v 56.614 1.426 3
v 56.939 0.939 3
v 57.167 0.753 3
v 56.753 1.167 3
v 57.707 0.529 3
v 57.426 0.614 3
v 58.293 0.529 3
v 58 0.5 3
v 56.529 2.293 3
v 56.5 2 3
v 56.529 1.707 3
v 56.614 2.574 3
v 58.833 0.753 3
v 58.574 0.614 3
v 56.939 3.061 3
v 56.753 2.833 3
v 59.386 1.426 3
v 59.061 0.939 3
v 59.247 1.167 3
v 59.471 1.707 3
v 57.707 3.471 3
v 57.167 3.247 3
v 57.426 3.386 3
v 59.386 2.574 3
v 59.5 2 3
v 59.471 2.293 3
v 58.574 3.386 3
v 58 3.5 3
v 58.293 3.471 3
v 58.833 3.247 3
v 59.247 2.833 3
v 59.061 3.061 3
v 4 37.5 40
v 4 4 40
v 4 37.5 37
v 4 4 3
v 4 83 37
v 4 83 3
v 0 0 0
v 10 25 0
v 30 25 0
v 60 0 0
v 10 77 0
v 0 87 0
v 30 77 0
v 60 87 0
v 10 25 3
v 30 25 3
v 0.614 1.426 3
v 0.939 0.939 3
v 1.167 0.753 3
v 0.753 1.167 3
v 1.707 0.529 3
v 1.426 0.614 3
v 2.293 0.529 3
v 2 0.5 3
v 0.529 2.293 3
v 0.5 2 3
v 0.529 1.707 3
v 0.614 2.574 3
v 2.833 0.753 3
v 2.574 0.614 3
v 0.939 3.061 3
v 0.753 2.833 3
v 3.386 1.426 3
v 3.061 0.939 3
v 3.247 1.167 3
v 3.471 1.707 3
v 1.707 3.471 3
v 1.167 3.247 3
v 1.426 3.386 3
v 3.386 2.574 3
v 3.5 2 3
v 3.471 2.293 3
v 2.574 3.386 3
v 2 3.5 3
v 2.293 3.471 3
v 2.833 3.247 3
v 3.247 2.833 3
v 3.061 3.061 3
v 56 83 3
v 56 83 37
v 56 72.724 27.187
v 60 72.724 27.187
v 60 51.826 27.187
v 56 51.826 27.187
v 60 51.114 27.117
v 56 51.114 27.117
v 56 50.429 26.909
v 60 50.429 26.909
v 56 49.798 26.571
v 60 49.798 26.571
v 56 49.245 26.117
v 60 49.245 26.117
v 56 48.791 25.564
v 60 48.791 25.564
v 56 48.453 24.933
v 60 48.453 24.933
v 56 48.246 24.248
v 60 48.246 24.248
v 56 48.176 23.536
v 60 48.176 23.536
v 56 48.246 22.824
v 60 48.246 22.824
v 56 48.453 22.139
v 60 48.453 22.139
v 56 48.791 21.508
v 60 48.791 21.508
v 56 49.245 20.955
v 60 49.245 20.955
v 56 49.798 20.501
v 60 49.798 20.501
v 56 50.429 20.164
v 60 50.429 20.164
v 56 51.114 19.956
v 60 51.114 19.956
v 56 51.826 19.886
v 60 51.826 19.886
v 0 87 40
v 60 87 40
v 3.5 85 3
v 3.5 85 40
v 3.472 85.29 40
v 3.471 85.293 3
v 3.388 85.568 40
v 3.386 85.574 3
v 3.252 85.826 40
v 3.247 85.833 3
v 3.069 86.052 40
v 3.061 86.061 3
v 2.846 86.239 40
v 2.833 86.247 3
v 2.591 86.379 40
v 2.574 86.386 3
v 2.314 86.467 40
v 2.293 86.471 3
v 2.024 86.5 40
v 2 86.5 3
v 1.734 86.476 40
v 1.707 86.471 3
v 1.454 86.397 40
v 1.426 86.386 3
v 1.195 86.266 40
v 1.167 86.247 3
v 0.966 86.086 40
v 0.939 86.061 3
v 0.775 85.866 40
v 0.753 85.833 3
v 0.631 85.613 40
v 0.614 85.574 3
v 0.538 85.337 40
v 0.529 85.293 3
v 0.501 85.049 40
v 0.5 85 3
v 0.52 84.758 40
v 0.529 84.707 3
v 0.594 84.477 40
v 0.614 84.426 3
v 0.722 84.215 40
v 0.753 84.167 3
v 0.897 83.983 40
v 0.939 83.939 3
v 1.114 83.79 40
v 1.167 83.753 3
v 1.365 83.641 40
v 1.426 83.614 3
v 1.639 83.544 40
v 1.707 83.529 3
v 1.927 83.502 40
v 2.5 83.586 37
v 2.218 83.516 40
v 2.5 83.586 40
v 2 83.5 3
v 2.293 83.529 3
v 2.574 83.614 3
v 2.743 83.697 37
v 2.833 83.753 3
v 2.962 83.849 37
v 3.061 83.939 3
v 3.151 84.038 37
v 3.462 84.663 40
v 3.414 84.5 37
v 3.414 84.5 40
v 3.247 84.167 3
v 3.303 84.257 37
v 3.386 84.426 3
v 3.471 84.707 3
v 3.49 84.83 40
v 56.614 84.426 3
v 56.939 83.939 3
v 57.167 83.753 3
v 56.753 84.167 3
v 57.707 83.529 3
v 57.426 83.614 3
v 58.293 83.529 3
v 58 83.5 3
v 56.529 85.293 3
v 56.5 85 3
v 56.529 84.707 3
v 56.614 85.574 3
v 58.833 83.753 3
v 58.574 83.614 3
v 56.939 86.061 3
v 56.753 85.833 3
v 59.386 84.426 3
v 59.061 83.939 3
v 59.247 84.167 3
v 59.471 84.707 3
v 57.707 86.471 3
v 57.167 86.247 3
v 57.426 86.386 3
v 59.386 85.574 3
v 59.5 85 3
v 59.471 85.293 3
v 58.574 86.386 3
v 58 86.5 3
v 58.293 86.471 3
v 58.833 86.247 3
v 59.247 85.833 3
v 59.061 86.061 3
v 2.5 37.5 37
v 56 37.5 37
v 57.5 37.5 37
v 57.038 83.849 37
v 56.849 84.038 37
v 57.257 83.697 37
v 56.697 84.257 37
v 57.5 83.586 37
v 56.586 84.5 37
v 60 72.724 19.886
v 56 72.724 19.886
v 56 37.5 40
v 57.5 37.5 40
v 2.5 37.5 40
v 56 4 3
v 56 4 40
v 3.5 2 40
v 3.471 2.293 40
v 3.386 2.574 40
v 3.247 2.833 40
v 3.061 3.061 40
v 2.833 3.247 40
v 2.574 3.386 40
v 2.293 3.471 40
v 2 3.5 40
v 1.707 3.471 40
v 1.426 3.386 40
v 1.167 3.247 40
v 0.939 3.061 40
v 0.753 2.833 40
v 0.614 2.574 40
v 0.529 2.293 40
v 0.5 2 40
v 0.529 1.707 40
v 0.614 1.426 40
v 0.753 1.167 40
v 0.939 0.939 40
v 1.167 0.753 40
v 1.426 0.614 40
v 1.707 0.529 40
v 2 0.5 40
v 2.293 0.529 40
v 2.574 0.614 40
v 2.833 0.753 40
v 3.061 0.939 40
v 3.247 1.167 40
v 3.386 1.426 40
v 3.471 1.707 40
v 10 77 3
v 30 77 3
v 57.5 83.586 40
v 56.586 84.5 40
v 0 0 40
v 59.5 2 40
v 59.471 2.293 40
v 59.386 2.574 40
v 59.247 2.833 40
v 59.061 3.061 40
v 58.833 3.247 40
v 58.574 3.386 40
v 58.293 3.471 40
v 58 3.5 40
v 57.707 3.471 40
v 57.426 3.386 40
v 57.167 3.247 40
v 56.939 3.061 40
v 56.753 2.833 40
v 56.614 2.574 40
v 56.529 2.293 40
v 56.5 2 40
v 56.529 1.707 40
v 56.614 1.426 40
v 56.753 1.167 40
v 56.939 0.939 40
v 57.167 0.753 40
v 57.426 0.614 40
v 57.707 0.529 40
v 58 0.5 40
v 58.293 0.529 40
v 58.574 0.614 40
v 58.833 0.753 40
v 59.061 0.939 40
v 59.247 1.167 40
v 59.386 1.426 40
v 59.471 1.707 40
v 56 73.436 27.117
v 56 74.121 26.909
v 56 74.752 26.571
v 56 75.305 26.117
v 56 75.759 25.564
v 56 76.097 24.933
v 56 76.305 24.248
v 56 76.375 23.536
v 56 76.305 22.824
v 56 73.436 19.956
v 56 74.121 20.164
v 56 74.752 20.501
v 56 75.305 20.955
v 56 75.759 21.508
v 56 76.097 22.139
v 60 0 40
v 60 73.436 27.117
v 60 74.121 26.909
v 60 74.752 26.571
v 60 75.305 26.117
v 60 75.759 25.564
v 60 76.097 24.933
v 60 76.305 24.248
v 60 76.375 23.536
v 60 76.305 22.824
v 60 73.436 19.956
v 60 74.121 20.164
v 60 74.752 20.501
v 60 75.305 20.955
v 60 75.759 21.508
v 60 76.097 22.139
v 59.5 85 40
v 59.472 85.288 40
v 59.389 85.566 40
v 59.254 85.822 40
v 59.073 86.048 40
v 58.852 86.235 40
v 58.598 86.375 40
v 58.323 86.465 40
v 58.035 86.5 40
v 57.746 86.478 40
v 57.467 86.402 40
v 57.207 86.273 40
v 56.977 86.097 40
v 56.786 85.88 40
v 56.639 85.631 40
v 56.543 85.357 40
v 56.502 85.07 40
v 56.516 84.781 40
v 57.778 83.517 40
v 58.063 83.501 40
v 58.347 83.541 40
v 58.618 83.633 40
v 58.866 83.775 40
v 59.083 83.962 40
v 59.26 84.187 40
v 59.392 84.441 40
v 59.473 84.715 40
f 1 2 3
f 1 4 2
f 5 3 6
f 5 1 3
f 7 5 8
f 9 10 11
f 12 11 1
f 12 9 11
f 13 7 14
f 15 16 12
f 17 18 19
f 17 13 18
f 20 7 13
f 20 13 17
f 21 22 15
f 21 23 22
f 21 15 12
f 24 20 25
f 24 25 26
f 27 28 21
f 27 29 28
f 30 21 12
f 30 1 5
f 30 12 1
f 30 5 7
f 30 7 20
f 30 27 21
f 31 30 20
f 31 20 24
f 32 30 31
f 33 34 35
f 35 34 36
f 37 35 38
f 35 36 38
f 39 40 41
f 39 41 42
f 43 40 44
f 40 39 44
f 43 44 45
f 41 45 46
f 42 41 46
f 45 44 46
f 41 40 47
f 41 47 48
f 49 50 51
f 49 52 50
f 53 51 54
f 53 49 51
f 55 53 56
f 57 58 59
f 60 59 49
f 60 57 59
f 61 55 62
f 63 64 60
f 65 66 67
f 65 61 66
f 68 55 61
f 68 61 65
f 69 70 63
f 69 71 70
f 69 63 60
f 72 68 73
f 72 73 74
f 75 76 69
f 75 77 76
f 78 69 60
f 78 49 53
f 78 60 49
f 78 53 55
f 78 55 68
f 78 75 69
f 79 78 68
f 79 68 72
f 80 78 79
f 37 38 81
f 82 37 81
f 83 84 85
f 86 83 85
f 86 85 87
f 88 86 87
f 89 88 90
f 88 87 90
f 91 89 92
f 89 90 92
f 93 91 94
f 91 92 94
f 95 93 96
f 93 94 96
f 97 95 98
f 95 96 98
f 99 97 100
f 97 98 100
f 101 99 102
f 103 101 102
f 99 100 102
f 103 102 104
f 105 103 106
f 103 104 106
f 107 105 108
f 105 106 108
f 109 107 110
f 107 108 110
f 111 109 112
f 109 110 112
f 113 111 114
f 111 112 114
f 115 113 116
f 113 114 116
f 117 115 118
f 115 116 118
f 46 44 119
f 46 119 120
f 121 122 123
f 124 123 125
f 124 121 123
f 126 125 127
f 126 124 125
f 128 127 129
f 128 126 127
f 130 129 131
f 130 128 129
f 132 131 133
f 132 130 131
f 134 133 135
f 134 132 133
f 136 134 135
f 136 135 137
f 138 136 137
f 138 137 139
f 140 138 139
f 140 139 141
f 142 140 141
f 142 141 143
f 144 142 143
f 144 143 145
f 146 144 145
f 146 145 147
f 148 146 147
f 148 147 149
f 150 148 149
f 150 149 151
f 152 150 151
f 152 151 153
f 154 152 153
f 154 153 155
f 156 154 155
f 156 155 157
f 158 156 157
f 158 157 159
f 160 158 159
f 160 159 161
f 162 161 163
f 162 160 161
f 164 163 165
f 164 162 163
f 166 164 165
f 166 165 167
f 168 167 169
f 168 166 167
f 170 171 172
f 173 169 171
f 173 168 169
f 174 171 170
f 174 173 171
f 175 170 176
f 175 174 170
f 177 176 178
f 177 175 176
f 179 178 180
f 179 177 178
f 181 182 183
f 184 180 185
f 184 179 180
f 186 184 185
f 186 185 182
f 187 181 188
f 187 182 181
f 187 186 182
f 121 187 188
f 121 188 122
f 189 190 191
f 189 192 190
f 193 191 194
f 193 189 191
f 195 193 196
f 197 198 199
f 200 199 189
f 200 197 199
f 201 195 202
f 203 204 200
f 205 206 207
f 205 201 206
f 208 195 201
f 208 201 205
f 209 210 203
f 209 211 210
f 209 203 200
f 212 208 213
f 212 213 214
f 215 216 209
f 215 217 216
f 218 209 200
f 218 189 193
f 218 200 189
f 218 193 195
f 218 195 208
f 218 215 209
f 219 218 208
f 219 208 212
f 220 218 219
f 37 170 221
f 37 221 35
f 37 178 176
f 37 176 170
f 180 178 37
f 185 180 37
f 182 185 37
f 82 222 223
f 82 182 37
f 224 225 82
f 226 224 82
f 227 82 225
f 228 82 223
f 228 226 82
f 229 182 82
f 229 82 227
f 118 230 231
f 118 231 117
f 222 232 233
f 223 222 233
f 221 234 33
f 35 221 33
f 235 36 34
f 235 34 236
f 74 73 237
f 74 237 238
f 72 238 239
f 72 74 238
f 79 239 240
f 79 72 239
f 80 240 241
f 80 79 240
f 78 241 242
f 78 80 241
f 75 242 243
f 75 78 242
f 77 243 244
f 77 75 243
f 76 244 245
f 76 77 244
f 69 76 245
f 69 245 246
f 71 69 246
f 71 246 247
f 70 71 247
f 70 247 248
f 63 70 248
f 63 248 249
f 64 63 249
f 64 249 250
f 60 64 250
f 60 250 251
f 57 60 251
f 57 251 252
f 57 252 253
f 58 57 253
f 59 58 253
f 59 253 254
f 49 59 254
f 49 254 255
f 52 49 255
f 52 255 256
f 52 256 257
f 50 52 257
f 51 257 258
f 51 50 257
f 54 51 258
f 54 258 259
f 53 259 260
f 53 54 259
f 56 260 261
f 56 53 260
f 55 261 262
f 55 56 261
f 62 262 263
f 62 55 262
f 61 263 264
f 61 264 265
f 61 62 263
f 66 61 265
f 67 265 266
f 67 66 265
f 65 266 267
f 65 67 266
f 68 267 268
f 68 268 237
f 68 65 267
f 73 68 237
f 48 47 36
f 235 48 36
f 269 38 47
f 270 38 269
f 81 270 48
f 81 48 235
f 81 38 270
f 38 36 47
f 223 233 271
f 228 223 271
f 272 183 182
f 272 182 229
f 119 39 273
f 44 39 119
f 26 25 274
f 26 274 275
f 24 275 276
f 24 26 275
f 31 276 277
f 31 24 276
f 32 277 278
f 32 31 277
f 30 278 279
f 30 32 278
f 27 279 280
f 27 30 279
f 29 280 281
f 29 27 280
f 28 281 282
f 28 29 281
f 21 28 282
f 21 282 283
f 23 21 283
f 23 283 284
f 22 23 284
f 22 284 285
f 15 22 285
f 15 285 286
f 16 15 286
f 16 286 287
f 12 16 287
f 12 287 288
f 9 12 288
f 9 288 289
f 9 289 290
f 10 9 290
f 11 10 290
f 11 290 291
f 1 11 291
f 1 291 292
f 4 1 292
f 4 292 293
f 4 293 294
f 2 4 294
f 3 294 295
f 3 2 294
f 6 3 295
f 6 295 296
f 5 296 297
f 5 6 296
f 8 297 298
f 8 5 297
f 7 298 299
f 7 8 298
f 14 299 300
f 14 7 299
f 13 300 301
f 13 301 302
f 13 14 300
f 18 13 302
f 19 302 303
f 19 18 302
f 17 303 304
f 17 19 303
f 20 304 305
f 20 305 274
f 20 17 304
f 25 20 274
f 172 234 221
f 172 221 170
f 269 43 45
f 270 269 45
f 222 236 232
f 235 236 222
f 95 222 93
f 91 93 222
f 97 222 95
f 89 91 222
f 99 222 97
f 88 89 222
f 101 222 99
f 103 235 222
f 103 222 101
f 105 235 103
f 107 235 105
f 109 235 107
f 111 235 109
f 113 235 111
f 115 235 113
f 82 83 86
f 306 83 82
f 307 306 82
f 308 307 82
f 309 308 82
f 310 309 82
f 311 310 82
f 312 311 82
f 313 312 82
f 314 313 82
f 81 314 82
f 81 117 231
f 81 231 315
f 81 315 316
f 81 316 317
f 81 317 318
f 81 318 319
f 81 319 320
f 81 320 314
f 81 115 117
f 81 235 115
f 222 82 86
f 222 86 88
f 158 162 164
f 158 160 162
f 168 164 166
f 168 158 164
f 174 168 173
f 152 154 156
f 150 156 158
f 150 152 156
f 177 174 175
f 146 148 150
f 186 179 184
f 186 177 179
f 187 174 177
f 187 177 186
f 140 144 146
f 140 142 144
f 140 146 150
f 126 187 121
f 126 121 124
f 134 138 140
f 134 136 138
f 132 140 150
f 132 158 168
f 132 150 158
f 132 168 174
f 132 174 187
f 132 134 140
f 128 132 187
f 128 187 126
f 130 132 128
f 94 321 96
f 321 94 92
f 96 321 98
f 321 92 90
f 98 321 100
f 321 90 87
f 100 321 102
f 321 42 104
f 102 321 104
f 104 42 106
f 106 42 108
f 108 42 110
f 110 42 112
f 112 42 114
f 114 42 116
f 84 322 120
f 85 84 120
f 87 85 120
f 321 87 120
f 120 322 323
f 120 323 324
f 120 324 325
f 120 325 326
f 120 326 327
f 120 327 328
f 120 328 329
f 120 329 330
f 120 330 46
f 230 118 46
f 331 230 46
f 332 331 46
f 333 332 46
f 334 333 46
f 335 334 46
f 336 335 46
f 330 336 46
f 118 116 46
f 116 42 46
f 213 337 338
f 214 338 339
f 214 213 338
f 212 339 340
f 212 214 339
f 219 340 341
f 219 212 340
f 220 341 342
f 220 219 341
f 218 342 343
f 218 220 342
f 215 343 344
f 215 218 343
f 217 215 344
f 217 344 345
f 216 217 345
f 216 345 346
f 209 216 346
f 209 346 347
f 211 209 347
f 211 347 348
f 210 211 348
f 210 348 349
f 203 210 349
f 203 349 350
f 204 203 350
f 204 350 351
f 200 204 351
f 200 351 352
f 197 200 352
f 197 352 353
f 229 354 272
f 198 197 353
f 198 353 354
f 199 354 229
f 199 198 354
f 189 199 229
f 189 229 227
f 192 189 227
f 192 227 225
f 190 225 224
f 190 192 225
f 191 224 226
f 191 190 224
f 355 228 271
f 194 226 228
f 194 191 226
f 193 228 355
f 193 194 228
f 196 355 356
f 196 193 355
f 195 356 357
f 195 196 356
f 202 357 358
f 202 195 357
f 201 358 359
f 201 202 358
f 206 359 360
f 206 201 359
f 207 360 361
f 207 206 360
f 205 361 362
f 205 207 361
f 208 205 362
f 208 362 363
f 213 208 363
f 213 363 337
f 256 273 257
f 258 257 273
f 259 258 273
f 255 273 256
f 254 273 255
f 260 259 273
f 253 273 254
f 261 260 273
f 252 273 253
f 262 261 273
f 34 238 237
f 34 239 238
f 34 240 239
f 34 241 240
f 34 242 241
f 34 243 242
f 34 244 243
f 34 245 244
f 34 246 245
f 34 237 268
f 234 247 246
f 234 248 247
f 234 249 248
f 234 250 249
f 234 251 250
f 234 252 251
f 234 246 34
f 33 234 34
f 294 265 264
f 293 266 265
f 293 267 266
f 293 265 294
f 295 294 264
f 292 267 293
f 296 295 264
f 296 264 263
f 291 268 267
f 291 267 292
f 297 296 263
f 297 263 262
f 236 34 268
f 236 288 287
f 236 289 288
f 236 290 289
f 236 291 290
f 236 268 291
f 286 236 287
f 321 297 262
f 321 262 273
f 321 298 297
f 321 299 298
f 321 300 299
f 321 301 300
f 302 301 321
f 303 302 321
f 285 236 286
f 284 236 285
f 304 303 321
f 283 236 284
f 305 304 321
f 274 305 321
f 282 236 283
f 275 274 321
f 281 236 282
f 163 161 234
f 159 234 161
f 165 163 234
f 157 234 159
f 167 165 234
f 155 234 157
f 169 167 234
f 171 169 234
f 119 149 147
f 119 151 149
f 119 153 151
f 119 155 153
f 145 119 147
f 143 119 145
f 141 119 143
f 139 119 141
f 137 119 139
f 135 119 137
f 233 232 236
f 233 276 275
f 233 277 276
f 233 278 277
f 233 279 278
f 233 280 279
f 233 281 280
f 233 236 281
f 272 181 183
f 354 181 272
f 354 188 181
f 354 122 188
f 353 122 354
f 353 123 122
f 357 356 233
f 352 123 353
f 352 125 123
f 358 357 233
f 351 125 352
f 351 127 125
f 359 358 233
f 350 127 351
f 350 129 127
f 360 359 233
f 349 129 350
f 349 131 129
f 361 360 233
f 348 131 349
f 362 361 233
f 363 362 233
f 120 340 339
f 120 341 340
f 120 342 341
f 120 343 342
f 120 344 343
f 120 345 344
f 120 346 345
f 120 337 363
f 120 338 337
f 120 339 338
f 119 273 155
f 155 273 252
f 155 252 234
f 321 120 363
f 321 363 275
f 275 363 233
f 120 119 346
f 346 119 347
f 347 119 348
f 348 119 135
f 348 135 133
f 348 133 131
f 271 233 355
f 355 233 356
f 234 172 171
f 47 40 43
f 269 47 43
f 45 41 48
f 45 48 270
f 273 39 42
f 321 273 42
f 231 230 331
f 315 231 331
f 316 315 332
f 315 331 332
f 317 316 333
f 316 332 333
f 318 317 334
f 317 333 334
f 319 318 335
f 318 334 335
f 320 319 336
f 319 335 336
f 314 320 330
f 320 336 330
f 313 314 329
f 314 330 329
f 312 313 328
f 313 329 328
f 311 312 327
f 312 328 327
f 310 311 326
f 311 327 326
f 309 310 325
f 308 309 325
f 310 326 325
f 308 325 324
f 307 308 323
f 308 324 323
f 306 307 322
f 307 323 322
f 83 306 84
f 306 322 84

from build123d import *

# Parameters (mm, degrees)
SKETCH_W        = 60
SKETCH_H        = 87
SKETCH_W_2      = 20
SKETCH_H_2      = 52
PAD_DEPTH       = 3
SKETCH001_W     = 60
SKETCH001_H     = 87
SKETCH001_R     = 1.5
SKETCH001_W_2   = 52
SKETCH001_H_2   = 79
PAD001_DEPTH    = 40
SKETCH002_W     = 55
SKETCH002_H     = 47
POCKET_DEPTH    = 3
POCKET001_DEPTH = 4


with BuildPart() as part:
    # Sketch → Pad (new body)
    with BuildSketch(Plane.XY):
        with Locations((30, 43.5)):
            Rectangle(SKETCH_W, SKETCH_H)
        with Locations((20, 51)):
            Rectangle(SKETCH_W_2, SKETCH_H_2, mode=Mode.SUBTRACT)
    extrude(amount=PAD_DEPTH)

    # Sketch001 (on Pad) → Pad001 (join)
    with BuildSketch(Plane.XY):
        with Locations((30, 43.5)):
            Rectangle(SKETCH001_W, SKETCH001_H)
        with Locations((2, 2)):
            Circle(SKETCH001_R, mode=Mode.SUBTRACT)
        with Locations((58, 2)):
            Circle(SKETCH001_R, mode=Mode.SUBTRACT)
        with Locations((2, 85)):
            Circle(SKETCH001_R, mode=Mode.SUBTRACT)
        with Locations((58, 85)):
            Circle(SKETCH001_R, mode=Mode.SUBTRACT)
        with Locations((30, 43.5)):
            Rectangle(SKETCH001_W_2, SKETCH001_H_2, mode=Mode.SUBTRACT)
    extrude(amount=PAD001_DEPTH)

    # Sketch002 (on Face20 of Pad001) → Pocket (cut)
    with BuildSketch(Plane.XY.offset(40)):
        with Locations((30, 61)):
            Rectangle(SKETCH002_W, SKETCH002_H)
    extrude(amount=-POCKET_DEPTH, mode=Mode.SUBTRACT)

    # Sketch003 (on Face26 of Pocket) → Pocket001 (cut)
    with BuildSketch(Plane.YZ.offset(60)):
        with BuildLine():
            ThreePointArc((72.724212, 19.885724), (76.374689, 23.536201), (72.724212, 27.186677))
            Line((72.724212, 27.186677), (51.825985, 27.186677))
            ThreePointArc((51.825985, 27.186677), (48.175508, 23.536201), (51.825985, 19.885724))
            Line((72.724212, 19.885724), (51.825985, 19.885724))
        make_face()
    extrude(amount=-POCKET001_DEPTH, mode=Mode.SUBTRACT)


solid = part.part
